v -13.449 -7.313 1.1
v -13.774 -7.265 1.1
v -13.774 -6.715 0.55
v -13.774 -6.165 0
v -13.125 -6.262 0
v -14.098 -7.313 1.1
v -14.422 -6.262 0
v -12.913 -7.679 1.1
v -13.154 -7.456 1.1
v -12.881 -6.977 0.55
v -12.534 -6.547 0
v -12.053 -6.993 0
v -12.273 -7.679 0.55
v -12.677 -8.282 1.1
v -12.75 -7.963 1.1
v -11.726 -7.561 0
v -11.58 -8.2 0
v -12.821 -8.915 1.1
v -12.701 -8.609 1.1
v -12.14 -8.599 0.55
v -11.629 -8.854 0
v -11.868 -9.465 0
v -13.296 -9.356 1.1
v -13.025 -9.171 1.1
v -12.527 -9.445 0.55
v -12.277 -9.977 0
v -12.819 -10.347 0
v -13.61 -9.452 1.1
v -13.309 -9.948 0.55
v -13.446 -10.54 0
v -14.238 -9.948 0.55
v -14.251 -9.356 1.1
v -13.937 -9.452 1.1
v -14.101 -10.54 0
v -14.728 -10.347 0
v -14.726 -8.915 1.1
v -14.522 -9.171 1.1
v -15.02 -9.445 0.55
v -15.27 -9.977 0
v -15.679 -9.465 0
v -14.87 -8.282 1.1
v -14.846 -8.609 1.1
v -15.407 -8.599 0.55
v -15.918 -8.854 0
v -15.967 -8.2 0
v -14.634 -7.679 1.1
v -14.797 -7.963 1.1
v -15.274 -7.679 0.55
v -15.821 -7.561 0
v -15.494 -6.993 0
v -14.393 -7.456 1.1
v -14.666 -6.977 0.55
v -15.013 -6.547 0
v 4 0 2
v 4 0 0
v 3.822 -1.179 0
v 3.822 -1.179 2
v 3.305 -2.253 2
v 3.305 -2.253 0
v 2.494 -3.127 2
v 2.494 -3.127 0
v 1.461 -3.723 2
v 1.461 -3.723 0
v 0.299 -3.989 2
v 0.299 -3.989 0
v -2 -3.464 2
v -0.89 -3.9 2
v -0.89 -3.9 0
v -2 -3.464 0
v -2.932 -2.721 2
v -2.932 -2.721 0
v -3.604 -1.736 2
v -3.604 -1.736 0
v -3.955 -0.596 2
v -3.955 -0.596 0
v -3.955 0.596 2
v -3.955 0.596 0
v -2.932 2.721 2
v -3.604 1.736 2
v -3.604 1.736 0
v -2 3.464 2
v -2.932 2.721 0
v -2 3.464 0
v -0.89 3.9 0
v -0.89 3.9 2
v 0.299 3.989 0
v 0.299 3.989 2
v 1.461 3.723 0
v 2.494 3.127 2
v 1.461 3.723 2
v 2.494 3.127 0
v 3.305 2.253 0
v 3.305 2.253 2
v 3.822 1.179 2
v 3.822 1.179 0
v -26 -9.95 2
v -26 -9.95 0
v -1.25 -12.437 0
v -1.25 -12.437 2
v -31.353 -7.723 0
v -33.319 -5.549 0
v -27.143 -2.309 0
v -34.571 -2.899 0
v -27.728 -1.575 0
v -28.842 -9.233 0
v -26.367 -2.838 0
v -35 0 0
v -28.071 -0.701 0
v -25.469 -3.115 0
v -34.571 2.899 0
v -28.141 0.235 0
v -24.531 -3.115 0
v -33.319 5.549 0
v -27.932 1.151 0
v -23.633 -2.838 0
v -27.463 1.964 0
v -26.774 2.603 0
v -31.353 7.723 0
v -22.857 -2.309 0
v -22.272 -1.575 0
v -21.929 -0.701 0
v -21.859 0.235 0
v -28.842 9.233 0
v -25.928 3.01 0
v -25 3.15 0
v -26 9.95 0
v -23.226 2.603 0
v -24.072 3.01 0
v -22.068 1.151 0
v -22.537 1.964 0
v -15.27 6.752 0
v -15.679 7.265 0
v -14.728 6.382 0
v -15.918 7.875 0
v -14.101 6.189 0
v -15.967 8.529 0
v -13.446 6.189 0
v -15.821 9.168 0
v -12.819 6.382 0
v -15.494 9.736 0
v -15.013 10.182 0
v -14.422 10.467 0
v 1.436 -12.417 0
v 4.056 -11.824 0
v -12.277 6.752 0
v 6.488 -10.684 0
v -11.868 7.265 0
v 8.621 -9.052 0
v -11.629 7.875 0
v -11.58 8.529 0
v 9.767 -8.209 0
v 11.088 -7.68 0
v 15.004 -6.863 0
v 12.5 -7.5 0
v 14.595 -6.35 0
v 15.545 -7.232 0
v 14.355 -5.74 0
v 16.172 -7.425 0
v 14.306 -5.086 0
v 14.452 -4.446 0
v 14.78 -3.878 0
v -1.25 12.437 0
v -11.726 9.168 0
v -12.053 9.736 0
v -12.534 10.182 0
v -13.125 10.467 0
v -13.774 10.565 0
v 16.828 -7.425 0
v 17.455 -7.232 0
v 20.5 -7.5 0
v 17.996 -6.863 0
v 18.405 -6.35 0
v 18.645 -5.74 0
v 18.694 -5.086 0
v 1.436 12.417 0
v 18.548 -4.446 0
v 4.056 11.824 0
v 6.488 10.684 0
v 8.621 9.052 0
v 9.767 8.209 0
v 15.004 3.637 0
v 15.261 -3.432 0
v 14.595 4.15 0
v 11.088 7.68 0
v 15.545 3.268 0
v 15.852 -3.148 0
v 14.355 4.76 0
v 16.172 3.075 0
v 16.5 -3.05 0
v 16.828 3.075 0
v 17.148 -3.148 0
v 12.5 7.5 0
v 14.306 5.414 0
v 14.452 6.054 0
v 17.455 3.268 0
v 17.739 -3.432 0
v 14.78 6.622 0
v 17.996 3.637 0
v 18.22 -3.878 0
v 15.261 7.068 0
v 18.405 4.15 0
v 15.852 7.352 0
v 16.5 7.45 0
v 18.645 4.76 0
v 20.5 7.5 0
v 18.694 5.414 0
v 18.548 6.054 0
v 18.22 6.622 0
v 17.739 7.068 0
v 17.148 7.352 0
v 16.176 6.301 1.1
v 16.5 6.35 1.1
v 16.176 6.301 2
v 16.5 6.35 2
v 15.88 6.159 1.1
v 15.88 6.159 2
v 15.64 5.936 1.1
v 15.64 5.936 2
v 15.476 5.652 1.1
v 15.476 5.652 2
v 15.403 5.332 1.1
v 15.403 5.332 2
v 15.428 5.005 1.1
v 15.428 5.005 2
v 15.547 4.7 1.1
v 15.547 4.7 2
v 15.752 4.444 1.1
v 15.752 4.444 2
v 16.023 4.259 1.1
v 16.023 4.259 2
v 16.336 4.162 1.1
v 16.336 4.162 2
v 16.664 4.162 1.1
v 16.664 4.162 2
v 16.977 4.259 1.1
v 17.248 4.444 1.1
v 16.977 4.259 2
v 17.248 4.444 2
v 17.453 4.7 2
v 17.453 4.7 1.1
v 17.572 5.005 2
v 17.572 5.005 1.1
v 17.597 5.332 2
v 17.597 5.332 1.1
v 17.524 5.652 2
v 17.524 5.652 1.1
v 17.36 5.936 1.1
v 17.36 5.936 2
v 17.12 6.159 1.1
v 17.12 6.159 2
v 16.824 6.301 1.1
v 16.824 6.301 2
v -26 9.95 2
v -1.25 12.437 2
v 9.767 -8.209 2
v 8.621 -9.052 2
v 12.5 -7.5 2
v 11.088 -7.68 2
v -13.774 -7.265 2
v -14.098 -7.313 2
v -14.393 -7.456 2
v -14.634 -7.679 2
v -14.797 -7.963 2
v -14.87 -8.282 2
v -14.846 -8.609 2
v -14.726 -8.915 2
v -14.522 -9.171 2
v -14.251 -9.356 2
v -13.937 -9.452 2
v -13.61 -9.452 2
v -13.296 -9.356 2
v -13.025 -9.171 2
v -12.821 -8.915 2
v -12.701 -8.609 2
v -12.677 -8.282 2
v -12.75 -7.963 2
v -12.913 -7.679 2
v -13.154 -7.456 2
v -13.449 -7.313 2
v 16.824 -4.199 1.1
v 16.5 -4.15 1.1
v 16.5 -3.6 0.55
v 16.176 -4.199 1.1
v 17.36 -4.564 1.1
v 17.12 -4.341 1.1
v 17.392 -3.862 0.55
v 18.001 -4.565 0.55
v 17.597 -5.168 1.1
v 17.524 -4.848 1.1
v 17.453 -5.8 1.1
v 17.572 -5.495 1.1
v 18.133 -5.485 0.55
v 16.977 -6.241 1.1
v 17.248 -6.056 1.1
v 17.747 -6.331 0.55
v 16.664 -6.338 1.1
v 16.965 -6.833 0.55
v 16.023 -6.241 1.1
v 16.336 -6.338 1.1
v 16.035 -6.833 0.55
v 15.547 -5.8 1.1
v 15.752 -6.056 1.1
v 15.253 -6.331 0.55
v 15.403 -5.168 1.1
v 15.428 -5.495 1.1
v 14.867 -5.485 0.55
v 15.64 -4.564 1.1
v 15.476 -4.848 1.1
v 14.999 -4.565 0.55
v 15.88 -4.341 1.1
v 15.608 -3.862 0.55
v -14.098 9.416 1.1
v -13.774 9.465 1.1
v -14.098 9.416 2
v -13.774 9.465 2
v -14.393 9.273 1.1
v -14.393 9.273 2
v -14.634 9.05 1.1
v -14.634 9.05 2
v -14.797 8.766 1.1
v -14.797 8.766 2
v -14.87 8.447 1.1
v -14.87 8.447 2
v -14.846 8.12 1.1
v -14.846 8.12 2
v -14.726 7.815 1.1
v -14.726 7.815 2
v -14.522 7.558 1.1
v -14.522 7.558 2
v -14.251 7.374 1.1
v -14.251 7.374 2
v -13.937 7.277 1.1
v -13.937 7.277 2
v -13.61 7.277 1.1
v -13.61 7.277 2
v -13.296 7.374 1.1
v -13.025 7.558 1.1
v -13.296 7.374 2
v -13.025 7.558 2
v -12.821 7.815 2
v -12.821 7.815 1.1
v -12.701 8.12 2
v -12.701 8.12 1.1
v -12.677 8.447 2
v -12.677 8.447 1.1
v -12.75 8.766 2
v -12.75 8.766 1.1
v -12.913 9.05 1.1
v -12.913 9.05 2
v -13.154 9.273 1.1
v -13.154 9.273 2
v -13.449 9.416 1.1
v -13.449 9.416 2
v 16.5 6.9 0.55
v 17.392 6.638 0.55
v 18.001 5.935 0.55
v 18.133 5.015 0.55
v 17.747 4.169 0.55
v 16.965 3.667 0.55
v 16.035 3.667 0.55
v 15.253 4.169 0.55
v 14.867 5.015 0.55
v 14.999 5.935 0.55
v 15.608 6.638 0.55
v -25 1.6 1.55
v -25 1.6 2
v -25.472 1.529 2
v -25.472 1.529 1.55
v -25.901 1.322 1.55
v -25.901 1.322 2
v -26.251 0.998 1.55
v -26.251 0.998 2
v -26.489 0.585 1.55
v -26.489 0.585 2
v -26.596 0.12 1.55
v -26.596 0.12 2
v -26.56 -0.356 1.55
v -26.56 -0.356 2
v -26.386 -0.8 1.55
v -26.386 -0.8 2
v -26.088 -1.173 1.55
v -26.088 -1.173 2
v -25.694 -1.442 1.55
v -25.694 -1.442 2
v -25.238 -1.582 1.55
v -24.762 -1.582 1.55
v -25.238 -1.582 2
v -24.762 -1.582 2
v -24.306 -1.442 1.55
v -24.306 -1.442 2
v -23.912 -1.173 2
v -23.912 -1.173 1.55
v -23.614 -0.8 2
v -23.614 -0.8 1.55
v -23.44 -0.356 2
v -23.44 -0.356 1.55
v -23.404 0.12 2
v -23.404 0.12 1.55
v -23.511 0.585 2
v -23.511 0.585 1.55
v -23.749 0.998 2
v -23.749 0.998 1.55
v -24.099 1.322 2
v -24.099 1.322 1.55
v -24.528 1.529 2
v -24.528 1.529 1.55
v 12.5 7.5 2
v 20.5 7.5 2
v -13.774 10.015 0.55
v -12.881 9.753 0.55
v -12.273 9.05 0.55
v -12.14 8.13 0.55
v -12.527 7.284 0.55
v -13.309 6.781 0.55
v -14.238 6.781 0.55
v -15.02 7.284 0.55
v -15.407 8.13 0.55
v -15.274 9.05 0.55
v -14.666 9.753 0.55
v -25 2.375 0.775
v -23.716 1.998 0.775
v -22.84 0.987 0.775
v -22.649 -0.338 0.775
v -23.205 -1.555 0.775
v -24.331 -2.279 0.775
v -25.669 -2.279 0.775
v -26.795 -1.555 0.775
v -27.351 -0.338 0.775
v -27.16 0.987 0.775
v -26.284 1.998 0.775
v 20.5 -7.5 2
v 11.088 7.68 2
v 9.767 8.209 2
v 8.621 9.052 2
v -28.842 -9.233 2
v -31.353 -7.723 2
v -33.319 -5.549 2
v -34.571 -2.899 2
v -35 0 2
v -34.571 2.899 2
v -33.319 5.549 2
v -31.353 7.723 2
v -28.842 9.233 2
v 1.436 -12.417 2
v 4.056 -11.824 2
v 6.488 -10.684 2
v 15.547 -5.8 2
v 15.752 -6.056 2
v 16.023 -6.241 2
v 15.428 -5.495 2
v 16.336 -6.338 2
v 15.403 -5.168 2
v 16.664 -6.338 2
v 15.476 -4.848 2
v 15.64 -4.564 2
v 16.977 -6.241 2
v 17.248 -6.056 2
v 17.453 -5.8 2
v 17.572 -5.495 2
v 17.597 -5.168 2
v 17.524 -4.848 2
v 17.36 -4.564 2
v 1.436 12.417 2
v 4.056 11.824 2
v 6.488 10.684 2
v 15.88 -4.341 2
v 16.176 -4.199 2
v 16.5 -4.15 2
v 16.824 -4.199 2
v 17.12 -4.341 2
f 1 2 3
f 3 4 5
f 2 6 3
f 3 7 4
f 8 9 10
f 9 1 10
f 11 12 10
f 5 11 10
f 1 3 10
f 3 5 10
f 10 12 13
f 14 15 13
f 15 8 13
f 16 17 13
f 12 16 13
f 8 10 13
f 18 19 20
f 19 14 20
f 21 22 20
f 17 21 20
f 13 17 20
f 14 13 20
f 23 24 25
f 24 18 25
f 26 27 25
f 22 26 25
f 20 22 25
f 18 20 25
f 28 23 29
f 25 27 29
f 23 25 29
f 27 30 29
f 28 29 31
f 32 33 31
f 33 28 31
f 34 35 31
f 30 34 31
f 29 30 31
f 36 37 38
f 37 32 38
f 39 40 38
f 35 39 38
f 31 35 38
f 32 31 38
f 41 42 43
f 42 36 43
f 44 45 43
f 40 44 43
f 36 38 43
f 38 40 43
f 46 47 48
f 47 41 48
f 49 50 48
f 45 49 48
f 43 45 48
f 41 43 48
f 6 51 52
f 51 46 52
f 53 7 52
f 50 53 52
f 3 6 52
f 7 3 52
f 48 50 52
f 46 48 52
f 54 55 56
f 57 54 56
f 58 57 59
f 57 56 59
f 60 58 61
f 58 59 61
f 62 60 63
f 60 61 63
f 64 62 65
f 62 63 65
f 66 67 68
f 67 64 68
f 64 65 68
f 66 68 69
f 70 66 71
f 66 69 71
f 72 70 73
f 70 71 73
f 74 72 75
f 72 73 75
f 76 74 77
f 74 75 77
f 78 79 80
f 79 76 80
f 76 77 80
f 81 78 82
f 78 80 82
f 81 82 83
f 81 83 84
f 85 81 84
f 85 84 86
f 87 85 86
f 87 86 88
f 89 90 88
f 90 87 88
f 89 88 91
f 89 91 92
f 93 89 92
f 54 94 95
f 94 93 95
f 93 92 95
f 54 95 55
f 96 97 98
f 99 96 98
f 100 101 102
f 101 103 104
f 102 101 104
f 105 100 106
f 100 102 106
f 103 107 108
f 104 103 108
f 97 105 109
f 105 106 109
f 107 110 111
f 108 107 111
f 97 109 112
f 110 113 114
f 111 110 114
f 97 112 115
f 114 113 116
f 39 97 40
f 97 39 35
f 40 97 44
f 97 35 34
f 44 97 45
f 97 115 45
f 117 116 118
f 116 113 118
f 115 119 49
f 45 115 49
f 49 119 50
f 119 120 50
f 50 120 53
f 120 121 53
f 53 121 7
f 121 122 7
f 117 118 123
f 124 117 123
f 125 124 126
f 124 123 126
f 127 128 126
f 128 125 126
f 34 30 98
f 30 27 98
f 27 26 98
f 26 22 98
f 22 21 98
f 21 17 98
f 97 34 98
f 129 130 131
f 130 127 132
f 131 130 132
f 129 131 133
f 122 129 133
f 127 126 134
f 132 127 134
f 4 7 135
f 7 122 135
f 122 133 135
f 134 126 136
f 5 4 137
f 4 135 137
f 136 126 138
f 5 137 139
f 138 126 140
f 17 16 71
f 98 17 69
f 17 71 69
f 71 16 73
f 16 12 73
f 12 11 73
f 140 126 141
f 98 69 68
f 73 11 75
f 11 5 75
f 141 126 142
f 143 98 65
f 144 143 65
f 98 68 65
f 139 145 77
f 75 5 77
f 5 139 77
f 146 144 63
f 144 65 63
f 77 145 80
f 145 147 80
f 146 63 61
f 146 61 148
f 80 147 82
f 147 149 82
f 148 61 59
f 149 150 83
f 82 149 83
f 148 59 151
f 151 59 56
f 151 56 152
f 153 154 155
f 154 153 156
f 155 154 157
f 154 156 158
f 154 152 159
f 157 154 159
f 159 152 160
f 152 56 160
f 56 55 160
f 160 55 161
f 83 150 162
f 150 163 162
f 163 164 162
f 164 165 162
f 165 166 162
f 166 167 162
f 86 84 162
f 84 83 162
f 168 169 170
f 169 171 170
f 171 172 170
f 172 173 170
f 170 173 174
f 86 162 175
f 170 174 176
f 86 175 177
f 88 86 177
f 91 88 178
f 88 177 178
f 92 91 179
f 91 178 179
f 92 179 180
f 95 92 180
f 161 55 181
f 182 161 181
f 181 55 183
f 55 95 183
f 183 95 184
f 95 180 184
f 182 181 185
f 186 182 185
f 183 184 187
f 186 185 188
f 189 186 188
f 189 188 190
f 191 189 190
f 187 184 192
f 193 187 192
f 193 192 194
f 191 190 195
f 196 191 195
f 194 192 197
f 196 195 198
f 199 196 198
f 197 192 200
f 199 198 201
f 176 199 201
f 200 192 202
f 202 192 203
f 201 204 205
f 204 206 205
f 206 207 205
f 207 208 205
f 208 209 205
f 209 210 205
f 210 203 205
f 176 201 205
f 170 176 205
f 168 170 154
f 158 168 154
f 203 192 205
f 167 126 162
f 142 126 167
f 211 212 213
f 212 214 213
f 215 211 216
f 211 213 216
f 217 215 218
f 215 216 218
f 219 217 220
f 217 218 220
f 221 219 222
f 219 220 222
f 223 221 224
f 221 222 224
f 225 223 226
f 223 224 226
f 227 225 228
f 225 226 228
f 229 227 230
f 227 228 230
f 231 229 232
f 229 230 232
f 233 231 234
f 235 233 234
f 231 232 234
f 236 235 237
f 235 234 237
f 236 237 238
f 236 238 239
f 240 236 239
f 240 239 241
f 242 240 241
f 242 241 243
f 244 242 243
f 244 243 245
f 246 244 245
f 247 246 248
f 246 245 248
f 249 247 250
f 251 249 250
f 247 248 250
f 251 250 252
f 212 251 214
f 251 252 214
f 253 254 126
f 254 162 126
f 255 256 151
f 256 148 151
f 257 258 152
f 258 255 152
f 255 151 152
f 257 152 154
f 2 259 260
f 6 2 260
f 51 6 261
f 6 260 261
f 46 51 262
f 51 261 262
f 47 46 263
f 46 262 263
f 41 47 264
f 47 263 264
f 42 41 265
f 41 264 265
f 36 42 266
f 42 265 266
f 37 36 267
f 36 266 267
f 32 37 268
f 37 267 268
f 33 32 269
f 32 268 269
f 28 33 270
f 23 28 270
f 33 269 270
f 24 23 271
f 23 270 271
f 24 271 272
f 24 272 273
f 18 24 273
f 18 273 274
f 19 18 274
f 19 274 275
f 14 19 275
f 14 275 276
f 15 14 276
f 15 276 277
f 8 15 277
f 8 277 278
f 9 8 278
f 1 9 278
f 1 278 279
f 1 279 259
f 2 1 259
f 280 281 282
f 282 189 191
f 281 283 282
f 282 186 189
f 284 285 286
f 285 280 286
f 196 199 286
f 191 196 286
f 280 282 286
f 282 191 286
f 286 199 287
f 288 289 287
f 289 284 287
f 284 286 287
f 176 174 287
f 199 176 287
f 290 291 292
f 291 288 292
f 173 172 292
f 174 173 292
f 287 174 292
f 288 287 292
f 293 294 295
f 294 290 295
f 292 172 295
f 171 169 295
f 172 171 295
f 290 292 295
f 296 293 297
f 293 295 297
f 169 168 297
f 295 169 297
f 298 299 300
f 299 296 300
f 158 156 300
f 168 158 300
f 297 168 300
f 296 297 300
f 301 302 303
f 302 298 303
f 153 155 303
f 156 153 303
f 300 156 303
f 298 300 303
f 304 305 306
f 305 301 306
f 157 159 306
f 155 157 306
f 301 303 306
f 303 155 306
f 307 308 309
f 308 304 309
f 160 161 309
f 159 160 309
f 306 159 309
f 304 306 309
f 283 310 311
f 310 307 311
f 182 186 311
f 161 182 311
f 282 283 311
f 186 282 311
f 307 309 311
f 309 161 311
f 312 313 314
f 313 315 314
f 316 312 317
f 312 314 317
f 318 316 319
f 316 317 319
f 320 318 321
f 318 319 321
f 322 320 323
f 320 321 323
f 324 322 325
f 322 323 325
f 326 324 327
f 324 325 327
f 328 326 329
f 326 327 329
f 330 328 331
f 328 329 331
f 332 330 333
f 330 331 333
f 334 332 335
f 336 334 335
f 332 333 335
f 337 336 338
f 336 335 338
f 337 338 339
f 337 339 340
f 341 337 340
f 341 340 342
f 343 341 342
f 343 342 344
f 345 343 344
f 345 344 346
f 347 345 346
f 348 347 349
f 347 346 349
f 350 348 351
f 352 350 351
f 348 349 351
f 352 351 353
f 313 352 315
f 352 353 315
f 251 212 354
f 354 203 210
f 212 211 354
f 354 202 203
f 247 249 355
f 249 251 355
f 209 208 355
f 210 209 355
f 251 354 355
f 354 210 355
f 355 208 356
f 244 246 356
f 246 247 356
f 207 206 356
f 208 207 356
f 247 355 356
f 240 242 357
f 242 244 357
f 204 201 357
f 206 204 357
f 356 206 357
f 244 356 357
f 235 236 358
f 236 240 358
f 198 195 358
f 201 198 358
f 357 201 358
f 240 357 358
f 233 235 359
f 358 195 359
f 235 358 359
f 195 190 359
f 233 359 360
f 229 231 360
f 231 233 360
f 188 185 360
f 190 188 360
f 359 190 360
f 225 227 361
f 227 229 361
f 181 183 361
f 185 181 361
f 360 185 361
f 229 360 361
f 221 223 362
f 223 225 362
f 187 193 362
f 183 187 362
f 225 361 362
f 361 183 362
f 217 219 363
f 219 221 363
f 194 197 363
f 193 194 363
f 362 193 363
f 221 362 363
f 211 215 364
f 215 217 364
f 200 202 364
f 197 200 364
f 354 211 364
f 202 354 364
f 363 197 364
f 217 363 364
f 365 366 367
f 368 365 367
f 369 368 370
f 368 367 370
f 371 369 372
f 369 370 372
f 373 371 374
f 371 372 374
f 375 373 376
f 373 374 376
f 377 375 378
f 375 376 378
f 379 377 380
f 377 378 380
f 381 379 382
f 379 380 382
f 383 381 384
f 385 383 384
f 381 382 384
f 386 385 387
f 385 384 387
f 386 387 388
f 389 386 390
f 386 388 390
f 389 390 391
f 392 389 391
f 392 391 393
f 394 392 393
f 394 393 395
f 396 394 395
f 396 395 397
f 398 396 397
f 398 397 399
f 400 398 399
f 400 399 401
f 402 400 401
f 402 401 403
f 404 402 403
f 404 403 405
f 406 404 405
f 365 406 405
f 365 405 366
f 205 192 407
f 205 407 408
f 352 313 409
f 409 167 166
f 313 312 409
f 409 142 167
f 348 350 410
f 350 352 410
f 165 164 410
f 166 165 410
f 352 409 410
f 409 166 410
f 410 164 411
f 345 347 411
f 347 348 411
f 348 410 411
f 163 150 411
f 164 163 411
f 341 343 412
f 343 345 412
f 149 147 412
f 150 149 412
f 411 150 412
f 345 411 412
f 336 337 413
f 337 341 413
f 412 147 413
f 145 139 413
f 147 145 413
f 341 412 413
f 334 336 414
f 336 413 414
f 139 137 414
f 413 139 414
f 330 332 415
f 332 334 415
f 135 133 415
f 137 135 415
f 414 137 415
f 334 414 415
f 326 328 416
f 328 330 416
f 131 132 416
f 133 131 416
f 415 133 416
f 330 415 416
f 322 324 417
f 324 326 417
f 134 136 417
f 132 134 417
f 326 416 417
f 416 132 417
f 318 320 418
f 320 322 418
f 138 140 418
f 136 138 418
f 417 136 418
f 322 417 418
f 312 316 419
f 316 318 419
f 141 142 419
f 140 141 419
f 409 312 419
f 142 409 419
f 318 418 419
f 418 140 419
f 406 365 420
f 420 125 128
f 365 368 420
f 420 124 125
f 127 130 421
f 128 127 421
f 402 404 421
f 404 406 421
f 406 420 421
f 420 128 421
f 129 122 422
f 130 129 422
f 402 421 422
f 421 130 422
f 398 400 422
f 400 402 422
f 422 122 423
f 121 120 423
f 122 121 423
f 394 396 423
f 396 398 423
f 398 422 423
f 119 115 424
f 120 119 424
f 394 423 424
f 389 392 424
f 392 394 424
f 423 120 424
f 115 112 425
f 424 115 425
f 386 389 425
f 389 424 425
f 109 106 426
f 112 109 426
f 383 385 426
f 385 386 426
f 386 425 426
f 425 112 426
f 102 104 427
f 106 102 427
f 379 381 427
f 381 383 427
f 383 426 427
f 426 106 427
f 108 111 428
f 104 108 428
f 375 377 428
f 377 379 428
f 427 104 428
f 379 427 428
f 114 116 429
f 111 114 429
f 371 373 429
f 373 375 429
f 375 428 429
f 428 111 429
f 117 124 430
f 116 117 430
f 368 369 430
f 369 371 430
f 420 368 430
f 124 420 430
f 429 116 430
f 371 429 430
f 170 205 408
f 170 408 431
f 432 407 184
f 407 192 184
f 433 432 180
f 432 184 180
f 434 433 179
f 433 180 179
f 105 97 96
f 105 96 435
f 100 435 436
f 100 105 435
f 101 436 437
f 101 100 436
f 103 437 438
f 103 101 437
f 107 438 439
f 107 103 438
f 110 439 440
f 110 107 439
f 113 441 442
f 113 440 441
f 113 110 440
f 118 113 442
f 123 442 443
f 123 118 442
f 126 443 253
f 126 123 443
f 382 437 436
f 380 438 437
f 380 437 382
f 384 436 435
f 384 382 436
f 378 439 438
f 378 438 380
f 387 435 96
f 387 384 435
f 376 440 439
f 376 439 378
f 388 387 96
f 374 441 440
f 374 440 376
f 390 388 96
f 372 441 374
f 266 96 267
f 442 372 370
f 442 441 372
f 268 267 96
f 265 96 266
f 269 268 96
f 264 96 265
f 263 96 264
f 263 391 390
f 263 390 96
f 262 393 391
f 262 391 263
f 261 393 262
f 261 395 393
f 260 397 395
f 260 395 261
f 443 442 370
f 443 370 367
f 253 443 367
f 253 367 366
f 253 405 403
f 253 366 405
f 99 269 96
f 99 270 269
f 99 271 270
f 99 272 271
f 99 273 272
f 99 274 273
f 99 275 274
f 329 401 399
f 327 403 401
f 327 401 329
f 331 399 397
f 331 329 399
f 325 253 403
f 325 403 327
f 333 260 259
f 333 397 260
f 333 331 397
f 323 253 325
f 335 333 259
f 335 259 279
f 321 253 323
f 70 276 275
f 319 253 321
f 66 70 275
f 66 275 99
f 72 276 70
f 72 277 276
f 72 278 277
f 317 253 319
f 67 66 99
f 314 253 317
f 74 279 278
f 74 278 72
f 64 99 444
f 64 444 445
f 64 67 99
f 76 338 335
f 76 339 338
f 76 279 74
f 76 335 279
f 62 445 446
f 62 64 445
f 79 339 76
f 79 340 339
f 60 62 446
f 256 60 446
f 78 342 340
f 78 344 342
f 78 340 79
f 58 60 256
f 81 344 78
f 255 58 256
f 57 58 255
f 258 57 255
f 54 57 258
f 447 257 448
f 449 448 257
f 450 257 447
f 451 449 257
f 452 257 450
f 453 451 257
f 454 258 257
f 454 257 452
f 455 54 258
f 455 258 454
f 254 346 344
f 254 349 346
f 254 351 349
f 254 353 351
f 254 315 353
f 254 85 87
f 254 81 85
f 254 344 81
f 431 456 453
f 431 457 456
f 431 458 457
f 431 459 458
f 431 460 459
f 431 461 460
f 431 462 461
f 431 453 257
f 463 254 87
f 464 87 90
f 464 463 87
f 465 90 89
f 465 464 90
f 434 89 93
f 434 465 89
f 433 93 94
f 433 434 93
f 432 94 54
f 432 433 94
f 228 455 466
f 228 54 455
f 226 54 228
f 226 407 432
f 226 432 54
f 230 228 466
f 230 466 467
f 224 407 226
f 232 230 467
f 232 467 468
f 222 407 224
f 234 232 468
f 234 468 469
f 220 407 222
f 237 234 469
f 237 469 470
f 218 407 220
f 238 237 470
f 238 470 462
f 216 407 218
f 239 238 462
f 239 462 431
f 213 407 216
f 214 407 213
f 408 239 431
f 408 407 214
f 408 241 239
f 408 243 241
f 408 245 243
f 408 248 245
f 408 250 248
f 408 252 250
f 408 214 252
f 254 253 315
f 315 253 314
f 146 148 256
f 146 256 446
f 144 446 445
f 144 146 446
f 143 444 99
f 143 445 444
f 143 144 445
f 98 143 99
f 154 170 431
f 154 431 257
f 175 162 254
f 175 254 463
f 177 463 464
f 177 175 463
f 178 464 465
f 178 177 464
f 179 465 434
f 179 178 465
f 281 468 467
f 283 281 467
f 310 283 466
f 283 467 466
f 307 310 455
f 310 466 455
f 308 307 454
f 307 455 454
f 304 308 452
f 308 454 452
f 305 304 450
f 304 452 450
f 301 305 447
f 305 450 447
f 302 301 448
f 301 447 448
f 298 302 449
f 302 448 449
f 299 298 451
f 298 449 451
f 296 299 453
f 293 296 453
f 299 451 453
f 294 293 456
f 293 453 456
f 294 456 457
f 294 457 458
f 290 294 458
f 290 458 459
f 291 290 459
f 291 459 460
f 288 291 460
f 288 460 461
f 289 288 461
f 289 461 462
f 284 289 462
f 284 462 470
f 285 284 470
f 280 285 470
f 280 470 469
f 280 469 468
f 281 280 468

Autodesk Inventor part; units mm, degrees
ref_plane "YZ Plane" through (0, 0, 0) normal (1, 0, 0) x (0, 1, 0)
ref_plane "XZ Plane" through (0, 0, 0) normal (0, 1, 0) x (-1, 0, 0)
ref_plane "XY Plane" through (0, 0, 0) normal (0, 0, 1) x (1, 0, 0)
sketch "Skizze1" plane through (0, 0, 0) normal (0, 0, 1) x (1, 0, 0)
  line L0 (0, 0) -> (20.5, 0) construction
  circle A0 centre (-25, 0) radius 2.25 construction
  line L1 (-25, 0) -> (0, 0) construction
  line L2 (-26, -9.9499) -> (-1.25, -12.4373)
  line L3 (-1.25, 12.4373) -> (-26, 9.9499)
  arc A1 (-26, 9.9499) -> (-26, -9.9499) centre (-25, 0) ccw
  arc A2 (-1.25, -12.4373) -> (-1.25, 12.4373) centre (0, 0) ccw construction
  circle A3 centre (0, 0) radius 4
  arc A4 (8.6207, 9.0517) -> (12.5, 7.5) centre (12.5, 13.125) ccw
  arc A5 (12.5, -7.5) -> (8.6207, -9.0517) centre (12.5, -13.125) ccw
  line L4 (12.5, 7.5) -> (20.5, 7.5)
  line L5 (20.5, 7.5) -> (20.5, -7.5)
  line L6 (20.5, -7.5) -> (12.5, -7.5)
  line L7 (12.5, -7.5) -> (12.5, 7.5) construction
  arc A6 (-1.25, -12.4373) -> (8.6207, -9.0517) centre (0, 0) ccw
  arc A7 (8.6207, 9.0517) -> (-1.25, 12.4373) centre (0, 0) ccw
  circle A8 centre (-25, 0) radius 4.875 construction
  line L8 (-25, 0) -> (-25, 4.875) construction
  circle A9 centre (0, 0) radius 10.15 construction
  line L9 (0, 0) -> (0, -10.15) construction
  line L10 (16.5, 5.25) -> (16.5, -5.25) construction
  line L11 (16.5, 7.5) -> (16.5, -7.5) construction
  circle A10 centre (-25, 0) radius 10 construction
  line L12 (-25, 0) -> (-13.7735, -8.3646) construction
  line L13 (-13.7735, -8.3646) -> (-14.0535, -11.1505) construction
  line L14 (-25, 0) -> (-13.7735, 8.3646) construction
  line L15 (-13.7735, 8.3646) -> (-14.0535, 11.1505) construction
  point P0 (-12.5, 0)
  point P1 (12.5, 0)
  point P2 (-29.2219, -2.4375)
  point P3 (-20.7781, -2.4375)
  point P4 (0, -10.15)
  point P5 (0, 10.15)
  point P6 (16.5, 0)
  dimension "d127" = 20.3
  dimension "Flansch_Hole_Dia" = 9.75
  dimension "d101" = 0
  dimension "CounterWeight_Swing_Rad" = 25
  dimension "d103" = 4.5
  dimension "d105" = 8
  dimension "d106" = 15
  dimension "LowerArm_ShaftFixation_Width" = 8
  dimension "d118" = 360
  dimension "d130" = 360
  dimension "d132" = 10.5
  dimension "d140" = 12.5
  dimension "LowerArm_Back_DiaOut" = 20
  dimension "d142" = 2.8
  dimension "LowerArm_Cover_FixationHole" = 14
  dimension "d144" = 14
  dimension "d145" = 2.8
extrude "Grundprofil" add sketch "Skizze1" along normal blind 2
hole "Hole10" at (-13.7735, -8.3646, 0) at (-13.7735, 8.3646, 0) direction (0, 0, 1) diameter 2.2 depth 12 tip angle 118 countersink diameter 4.4 countersink angle 90 clearance for "Countersunk Flat Head Screw DIN EN ISO 2009" size "M2" standard "DIN"
hole "Hole11" at (16.5, 5.25, 0) at (16.5, -5.25, 0) direction (0, 0, 1) diameter 2.2 depth 3 tip angle 118 countersink diameter 4.4 countersink angle 90 clearance for "Countersunk Raised Head Screw ISO 2010/7047" size "M2" standard "ISO"
hole "Hole12" at (-25, 0, 0) direction (0, 0, 1) diameter 3.2 depth 12 tip angle 118 countersink diameter 6.3 countersink angle 90 clearance for "Countersunk Flat Head Screw DIN EN ISO 2009" size "M3" standard "DIN"
properties part number "Lower_Arm_v3" material "Aluminum 6061"
